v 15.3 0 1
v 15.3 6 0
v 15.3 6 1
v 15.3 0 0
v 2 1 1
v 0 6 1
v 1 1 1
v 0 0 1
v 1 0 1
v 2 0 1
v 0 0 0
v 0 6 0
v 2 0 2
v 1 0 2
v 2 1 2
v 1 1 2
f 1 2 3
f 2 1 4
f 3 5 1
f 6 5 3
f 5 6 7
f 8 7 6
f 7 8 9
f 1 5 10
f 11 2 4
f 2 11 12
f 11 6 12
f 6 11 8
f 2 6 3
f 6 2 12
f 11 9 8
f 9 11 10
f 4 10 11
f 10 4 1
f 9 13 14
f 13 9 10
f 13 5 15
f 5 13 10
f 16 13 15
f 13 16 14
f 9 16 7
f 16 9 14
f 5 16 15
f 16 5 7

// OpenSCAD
PadLen = 15.3;
PadWid = 6;
PadHei = 1;

union(){
    cube([PadLen, PadWid, PadHei]);
    translate([1, 0, 1])cube([1,1,1]);
}
